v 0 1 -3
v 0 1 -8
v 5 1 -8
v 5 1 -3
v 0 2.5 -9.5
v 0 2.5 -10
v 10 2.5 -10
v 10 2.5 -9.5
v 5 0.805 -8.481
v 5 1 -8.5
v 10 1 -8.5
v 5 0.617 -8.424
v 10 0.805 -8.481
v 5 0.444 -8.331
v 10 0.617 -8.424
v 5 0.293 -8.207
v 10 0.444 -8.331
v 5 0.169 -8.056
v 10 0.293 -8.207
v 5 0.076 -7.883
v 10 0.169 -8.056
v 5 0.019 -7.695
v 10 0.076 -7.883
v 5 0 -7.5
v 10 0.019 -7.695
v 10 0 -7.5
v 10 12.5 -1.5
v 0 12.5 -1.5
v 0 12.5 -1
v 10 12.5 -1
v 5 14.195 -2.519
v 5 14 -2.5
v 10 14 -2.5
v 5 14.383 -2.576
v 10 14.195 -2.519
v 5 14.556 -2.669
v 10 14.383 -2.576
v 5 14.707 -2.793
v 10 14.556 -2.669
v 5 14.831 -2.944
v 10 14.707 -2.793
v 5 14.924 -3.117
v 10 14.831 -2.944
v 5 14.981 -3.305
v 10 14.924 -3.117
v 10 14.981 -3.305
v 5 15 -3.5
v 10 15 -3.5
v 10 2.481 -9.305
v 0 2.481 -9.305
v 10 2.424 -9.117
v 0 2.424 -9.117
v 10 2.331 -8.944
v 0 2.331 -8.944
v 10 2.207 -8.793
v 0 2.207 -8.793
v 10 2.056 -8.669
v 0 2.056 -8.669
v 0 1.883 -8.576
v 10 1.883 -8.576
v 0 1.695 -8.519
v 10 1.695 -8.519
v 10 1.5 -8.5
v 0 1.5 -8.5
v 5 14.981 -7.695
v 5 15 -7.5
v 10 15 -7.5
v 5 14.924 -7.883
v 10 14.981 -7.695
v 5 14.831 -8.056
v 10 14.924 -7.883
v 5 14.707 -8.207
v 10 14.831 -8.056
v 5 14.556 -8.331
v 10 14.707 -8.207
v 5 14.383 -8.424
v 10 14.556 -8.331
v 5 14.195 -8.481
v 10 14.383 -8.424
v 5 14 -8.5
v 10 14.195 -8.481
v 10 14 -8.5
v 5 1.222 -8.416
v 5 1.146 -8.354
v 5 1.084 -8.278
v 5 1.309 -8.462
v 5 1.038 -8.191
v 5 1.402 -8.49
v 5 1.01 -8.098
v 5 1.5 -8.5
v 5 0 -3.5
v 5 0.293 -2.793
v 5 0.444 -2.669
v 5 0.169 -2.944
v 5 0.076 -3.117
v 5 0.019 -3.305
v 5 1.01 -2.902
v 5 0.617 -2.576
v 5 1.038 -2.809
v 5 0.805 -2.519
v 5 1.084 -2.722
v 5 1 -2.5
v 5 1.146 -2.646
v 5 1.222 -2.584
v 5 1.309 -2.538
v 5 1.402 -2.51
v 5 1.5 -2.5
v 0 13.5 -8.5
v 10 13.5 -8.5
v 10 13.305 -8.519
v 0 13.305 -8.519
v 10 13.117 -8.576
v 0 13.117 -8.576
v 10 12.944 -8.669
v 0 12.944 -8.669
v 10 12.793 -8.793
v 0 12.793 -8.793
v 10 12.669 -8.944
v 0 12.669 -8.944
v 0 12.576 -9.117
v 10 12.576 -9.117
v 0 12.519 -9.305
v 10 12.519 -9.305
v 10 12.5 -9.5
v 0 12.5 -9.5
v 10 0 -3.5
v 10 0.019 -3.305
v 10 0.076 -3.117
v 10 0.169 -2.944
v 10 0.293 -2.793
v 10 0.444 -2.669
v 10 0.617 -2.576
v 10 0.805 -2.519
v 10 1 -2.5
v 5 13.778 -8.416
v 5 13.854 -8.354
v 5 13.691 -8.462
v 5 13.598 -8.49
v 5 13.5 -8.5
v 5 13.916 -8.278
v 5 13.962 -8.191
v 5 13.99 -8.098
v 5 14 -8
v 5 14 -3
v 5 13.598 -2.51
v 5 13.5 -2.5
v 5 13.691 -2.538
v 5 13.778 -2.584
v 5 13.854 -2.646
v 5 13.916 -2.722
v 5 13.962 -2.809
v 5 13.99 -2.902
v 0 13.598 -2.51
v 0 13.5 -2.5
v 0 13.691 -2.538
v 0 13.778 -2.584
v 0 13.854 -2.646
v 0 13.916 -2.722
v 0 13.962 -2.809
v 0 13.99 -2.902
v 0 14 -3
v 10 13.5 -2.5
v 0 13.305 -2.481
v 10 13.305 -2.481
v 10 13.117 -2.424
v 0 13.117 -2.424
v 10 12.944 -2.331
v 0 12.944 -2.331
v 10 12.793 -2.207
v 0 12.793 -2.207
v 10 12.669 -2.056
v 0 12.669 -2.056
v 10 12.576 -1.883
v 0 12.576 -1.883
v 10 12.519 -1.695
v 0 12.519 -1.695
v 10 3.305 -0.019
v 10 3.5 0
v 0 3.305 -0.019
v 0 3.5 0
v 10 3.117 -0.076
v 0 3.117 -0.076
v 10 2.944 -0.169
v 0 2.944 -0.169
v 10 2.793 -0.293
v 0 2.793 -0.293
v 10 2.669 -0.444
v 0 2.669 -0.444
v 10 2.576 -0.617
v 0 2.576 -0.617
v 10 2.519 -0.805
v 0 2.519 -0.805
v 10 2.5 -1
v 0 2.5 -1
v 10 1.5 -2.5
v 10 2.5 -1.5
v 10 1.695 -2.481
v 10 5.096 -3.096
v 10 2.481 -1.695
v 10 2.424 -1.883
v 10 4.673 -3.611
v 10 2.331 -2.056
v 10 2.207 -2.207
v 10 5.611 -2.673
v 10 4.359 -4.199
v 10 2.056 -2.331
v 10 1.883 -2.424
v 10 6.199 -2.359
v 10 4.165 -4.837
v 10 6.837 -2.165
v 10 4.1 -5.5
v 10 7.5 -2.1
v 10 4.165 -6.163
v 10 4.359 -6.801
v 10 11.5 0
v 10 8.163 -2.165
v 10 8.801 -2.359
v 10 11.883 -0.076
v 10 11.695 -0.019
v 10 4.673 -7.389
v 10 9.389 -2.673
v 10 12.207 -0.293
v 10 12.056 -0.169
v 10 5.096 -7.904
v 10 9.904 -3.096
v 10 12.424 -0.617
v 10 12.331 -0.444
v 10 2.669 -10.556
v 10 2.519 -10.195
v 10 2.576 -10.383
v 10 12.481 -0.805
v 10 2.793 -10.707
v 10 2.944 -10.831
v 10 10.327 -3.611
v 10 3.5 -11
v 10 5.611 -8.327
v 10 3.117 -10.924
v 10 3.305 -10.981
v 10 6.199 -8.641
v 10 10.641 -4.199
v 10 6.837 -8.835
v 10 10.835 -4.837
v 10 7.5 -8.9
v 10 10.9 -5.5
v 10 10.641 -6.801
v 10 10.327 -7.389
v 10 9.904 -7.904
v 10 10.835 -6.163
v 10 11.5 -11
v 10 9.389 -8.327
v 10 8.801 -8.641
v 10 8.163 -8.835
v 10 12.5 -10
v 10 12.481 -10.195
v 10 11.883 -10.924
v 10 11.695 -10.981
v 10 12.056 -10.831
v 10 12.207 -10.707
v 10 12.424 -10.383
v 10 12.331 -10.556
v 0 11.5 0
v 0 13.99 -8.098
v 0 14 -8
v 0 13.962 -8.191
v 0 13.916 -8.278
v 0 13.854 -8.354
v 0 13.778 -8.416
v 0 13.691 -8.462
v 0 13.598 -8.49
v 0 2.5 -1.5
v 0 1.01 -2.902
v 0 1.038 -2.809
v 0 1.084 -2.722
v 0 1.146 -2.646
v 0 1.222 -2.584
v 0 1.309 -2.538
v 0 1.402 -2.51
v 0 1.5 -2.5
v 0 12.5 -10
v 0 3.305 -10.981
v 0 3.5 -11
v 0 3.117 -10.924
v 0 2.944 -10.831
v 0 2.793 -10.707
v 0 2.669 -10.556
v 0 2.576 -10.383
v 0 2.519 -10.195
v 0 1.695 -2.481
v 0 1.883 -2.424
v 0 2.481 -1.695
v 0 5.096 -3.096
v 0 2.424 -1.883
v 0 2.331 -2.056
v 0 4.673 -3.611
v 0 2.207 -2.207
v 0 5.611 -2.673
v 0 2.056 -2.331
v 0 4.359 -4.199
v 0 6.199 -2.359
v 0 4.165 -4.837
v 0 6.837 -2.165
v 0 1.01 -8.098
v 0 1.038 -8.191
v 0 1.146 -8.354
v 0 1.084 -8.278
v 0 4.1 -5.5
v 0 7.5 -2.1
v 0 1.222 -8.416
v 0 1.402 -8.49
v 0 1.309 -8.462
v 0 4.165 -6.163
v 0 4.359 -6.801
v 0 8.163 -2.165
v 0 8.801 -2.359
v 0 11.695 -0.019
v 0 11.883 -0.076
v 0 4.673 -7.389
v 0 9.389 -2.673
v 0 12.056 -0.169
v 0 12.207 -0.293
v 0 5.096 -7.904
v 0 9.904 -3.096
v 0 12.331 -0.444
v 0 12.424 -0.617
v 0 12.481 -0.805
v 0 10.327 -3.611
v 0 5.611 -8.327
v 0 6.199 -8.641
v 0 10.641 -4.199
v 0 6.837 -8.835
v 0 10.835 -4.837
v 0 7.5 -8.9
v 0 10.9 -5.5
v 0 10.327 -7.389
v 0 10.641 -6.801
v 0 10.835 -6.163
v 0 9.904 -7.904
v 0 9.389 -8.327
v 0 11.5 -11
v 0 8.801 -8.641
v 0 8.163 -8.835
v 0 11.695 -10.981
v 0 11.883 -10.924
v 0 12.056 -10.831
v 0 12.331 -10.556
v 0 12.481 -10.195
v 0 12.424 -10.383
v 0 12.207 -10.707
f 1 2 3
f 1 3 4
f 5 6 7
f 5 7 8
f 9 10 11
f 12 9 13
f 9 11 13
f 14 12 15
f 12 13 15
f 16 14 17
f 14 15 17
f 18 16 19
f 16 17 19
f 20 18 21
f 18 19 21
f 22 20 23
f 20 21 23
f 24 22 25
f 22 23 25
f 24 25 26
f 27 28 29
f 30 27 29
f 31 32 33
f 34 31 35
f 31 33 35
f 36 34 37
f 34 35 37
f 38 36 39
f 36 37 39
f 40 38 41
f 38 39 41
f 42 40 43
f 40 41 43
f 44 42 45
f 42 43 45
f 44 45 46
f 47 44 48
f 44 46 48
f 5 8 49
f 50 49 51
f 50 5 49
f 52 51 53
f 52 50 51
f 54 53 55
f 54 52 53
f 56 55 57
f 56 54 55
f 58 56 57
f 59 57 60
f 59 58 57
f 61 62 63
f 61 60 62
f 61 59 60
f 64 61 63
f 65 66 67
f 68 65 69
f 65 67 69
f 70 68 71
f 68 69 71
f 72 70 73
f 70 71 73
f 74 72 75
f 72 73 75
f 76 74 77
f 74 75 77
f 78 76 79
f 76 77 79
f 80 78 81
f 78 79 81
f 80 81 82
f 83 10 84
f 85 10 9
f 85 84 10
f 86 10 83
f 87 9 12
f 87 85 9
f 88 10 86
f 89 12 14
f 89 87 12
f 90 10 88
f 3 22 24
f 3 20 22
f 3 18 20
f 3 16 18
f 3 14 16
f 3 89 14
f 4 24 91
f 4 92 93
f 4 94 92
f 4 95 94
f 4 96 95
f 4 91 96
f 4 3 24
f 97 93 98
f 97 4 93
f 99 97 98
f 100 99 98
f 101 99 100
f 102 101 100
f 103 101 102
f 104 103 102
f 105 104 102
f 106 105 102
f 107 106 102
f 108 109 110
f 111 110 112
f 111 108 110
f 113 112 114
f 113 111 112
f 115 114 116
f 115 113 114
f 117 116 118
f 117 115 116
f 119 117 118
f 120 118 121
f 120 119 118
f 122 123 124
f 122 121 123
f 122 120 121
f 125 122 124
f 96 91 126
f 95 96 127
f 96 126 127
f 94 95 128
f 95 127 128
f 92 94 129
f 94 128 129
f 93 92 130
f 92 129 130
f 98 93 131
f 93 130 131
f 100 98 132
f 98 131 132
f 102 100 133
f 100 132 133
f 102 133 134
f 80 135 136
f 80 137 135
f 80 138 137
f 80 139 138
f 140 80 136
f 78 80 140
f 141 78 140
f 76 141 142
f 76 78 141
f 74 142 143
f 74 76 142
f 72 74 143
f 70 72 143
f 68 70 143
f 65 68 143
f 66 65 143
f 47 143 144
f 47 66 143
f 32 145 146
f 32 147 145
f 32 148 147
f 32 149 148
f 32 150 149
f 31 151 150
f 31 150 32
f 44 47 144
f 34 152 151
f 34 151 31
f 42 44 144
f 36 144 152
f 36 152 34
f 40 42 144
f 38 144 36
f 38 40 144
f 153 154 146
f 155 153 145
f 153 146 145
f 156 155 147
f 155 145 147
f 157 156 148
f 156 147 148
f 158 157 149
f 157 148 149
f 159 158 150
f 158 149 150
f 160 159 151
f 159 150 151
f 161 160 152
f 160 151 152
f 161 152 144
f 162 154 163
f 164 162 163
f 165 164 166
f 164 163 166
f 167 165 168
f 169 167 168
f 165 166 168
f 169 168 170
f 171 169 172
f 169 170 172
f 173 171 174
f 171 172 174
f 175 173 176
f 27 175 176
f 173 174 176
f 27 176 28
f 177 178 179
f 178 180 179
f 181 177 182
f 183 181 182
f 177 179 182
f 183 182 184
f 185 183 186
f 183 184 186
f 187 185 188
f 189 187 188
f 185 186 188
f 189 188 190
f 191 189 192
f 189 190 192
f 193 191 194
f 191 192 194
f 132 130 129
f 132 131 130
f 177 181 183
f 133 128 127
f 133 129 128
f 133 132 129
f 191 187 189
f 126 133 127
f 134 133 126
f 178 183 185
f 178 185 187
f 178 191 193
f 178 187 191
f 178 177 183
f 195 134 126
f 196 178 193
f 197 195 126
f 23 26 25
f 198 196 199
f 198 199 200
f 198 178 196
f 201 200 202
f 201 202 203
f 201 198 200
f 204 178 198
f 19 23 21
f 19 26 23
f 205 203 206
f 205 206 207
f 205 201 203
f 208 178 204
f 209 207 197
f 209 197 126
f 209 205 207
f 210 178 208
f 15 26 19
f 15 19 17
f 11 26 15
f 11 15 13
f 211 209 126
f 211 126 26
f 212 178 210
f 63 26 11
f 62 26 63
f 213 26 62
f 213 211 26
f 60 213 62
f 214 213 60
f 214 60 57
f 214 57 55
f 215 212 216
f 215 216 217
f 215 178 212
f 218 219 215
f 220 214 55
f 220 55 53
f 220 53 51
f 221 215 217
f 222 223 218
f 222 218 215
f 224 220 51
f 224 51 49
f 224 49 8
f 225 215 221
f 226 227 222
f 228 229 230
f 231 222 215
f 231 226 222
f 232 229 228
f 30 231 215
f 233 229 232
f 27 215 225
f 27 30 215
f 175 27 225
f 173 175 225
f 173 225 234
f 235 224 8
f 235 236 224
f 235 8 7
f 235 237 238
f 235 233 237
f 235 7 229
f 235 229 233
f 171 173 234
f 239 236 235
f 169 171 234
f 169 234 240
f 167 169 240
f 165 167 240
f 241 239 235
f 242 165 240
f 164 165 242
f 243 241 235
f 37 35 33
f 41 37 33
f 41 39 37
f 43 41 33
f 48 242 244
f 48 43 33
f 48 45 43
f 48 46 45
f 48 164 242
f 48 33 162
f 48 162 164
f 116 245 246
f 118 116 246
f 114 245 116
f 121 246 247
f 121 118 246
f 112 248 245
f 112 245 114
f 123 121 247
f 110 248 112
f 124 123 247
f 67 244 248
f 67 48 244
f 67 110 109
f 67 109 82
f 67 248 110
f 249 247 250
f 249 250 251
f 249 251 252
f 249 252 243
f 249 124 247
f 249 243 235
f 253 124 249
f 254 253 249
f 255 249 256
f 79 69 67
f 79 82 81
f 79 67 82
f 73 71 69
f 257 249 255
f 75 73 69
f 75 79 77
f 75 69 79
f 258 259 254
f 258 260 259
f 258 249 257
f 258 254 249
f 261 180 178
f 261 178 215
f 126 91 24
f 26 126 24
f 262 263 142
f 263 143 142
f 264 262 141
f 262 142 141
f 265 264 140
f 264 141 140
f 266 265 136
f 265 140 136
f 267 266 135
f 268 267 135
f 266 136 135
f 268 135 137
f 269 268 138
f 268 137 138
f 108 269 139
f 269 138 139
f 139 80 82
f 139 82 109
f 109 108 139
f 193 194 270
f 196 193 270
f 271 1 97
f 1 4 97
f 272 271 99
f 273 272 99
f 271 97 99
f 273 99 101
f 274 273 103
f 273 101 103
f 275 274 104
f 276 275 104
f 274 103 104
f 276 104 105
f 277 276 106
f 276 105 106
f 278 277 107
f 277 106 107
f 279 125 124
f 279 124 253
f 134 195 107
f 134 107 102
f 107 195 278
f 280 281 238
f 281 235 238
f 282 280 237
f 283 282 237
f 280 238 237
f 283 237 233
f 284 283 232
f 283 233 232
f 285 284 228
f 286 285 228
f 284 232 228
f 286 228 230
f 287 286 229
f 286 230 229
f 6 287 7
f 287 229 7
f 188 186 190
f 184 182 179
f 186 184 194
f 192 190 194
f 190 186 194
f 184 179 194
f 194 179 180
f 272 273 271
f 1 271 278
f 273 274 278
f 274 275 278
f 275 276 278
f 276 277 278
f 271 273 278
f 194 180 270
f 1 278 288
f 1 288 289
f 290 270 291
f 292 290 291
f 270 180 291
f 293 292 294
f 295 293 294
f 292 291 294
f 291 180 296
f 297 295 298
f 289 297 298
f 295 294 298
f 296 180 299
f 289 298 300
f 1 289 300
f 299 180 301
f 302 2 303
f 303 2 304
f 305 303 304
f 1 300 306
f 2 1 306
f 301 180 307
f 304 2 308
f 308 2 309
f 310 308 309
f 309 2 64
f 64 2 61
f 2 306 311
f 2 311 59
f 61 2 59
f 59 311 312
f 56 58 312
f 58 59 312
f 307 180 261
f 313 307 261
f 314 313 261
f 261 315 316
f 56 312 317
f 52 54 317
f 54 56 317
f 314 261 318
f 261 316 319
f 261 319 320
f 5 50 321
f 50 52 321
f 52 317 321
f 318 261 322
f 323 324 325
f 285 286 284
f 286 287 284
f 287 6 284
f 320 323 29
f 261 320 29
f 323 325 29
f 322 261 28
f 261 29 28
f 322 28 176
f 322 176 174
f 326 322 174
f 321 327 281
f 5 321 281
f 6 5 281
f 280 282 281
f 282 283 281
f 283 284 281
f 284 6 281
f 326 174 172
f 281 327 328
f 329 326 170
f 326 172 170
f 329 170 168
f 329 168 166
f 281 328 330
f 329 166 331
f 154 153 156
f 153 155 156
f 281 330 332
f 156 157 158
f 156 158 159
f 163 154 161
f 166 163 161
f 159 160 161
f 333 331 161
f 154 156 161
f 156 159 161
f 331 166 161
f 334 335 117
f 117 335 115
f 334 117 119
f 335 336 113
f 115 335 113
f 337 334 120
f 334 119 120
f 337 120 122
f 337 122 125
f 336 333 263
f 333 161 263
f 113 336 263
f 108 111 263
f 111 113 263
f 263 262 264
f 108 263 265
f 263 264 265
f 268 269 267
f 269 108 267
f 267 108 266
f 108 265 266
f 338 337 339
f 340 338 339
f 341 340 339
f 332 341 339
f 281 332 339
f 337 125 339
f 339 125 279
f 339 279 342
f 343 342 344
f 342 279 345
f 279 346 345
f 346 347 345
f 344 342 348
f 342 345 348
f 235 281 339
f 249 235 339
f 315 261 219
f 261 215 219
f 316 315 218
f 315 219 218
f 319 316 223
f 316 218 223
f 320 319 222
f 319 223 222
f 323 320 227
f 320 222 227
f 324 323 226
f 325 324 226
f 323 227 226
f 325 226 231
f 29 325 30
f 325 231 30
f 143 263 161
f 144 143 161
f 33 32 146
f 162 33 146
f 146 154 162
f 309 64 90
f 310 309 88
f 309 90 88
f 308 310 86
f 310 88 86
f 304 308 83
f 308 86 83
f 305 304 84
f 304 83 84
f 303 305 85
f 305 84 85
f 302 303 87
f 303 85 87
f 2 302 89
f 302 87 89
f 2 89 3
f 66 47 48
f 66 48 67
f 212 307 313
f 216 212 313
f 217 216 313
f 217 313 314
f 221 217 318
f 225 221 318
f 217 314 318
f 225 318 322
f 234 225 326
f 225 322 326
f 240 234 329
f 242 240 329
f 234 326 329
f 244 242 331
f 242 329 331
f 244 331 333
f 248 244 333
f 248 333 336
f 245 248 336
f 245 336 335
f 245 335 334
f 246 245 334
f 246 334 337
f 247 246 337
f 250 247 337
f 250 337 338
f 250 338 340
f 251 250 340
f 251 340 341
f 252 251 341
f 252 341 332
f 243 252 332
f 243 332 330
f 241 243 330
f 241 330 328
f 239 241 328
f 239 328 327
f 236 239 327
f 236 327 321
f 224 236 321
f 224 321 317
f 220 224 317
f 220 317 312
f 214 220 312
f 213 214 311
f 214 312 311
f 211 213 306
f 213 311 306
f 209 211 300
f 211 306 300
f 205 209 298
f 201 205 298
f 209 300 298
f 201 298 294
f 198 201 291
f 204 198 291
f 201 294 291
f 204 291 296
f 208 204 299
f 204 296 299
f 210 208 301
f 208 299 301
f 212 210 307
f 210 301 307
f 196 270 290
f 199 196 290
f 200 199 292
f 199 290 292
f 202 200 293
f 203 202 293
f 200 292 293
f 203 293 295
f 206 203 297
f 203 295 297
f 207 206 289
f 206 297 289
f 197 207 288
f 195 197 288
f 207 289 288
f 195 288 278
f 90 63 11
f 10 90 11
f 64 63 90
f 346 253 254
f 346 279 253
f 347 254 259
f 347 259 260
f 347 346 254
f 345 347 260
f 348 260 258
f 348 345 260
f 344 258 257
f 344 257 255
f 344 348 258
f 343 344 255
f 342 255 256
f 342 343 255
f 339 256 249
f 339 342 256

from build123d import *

# Parameters (mm, degrees)
SKETCH1_W           = 11
SKETCH1_H           = 15
BOSS_EXTRUDE1_DEPTH = 10
SKETCH3_R           = 3.4
CUT_EXTRUDE1_DEPTH  = 22.118712082
CUT_EXTRUDE2_DEPTH  = 22.118712082
FILLET1_R           = 1
SKETCH5_W           = 30.35499422
SKETCH5_H           = 5.878934171
SKETCH5_W_2         = 28.690297522
SKETCH5_H_2         = 3.597414723
CUT_EXTRUDE3_DEPTH  = 5
FILLET2_R           = 0.5


with BuildPart() as part:
    # Sketch1 → Boss-Extrude1 (new body)
    with BuildSketch(Plane(origin=(0, 0, 0), x_dir=(0, 0, -1), z_dir=(1, 0, 0))):
        with Locations((5.5, 7.5)):
            Rectangle(SKETCH1_W, SKETCH1_H)
    extrude(amount=BOSS_EXTRUDE1_DEPTH)

    # Sketch3 → Cut-Extrude1 (cut, through all)
    with BuildSketch(Plane.ZY):
        with Locations((-5.5, 7.5)):
            Circle(SKETCH3_R)
    extrude(amount=-CUT_EXTRUDE1_DEPTH, mode=Mode.SUBTRACT)

    # Sketch4 → Cut-Extrude2 (cut, through all)
    with BuildSketch(Plane.ZY):
        with BuildLine():
            Line((-8.5, 15), (-8.5, 13.5))
            ThreePointArc((-8.5, 13.5), (-8.792893219, 12.792893219), (-9.5, 12.5))
            Line((-9.5, 12.5), (-12.5, 12.5))
            Line((-12.5, 12.5), (-12.5, 2.5))
            Line((-12.5, 2.5), (-9.5, 2.5))
            ThreePointArc((-9.5, 2.5), (-8.792893219, 2.207106781), (-8.5, 1.5))
            Line((-8.5, 1.5), (-8.5, 0))
            Line((-8.5, 0), (-16.5, 0))
            Line((-16.5, 0), (-16.5, 15))
            Line((-16.5, 15), (-8.5, 15))
        make_face()
        with BuildLine():
            Line((-2.5, 1.5), (-2.5, 0))
            Line((-2.5, 0), (6, 0))
            Line((6, 0), (6, 15))
            Line((6, 15), (-2.5, 15))
            Line((-2.5, 15), (-2.5, 13.5))
            ThreePointArc((-2.5, 13.5), (-2.207106781, 12.792893219), (-1.5, 12.5))
            Line((-1.5, 12.5), (1.5, 12.5))
            Line((1.5, 12.5), (1.5, 2.5))
            Line((1.5, 2.5), (-1.5, 2.5))
            ThreePointArc((-1.5, 2.5), (-2.207106781, 2.207106781), (-2.5, 1.5))
        make_face()
    extrude(amount=-CUT_EXTRUDE2_DEPTH, mode=Mode.SUBTRACT)

    # Fillet1
    fillet1_edges = [part.edges().sort_by_distance(p)[0] for p in [
        (5, 12.5, -11),
        (5, 2.5, -11),
        (5, 0, -8.5),
        (5, 15, -8.5),
        (5, 15, -2.5),
        (5, 2.5, 0),
        (5, 12.5, 0),
        (5, 0, -2.5),
    ]]
    fillet(fillet1_edges, radius=FILLET1_R)

    # Sketch5 → Cut-Extrude3 (cut)
    with BuildSketch(Plane.ZY):
        with Locations((-1.883853424, 16.939467085)):
            Rectangle(SKETCH5_W, SKETCH5_H)
        with Locations((-4.752769967, -0.798707361)):
            Rectangle(SKETCH5_W_2, SKETCH5_H_2)
    extrude(amount=-CUT_EXTRUDE3_DEPTH, mode=Mode.SUBTRACT)

    # Fillet2
    fillet2_edges = [part.edges().sort_by_distance(p)[0] for p in [
        (2.5, 1, -8.5),
        (2.5, 1, -2.5),
        (2.5, 14, -8.5),
        (2.5, 14, -2.5),
    ]]
    fillet(fillet2_edges, radius=FILLET2_R - 0.0001)  # a hair under: the kernel refuses the full size


solid = part.part
